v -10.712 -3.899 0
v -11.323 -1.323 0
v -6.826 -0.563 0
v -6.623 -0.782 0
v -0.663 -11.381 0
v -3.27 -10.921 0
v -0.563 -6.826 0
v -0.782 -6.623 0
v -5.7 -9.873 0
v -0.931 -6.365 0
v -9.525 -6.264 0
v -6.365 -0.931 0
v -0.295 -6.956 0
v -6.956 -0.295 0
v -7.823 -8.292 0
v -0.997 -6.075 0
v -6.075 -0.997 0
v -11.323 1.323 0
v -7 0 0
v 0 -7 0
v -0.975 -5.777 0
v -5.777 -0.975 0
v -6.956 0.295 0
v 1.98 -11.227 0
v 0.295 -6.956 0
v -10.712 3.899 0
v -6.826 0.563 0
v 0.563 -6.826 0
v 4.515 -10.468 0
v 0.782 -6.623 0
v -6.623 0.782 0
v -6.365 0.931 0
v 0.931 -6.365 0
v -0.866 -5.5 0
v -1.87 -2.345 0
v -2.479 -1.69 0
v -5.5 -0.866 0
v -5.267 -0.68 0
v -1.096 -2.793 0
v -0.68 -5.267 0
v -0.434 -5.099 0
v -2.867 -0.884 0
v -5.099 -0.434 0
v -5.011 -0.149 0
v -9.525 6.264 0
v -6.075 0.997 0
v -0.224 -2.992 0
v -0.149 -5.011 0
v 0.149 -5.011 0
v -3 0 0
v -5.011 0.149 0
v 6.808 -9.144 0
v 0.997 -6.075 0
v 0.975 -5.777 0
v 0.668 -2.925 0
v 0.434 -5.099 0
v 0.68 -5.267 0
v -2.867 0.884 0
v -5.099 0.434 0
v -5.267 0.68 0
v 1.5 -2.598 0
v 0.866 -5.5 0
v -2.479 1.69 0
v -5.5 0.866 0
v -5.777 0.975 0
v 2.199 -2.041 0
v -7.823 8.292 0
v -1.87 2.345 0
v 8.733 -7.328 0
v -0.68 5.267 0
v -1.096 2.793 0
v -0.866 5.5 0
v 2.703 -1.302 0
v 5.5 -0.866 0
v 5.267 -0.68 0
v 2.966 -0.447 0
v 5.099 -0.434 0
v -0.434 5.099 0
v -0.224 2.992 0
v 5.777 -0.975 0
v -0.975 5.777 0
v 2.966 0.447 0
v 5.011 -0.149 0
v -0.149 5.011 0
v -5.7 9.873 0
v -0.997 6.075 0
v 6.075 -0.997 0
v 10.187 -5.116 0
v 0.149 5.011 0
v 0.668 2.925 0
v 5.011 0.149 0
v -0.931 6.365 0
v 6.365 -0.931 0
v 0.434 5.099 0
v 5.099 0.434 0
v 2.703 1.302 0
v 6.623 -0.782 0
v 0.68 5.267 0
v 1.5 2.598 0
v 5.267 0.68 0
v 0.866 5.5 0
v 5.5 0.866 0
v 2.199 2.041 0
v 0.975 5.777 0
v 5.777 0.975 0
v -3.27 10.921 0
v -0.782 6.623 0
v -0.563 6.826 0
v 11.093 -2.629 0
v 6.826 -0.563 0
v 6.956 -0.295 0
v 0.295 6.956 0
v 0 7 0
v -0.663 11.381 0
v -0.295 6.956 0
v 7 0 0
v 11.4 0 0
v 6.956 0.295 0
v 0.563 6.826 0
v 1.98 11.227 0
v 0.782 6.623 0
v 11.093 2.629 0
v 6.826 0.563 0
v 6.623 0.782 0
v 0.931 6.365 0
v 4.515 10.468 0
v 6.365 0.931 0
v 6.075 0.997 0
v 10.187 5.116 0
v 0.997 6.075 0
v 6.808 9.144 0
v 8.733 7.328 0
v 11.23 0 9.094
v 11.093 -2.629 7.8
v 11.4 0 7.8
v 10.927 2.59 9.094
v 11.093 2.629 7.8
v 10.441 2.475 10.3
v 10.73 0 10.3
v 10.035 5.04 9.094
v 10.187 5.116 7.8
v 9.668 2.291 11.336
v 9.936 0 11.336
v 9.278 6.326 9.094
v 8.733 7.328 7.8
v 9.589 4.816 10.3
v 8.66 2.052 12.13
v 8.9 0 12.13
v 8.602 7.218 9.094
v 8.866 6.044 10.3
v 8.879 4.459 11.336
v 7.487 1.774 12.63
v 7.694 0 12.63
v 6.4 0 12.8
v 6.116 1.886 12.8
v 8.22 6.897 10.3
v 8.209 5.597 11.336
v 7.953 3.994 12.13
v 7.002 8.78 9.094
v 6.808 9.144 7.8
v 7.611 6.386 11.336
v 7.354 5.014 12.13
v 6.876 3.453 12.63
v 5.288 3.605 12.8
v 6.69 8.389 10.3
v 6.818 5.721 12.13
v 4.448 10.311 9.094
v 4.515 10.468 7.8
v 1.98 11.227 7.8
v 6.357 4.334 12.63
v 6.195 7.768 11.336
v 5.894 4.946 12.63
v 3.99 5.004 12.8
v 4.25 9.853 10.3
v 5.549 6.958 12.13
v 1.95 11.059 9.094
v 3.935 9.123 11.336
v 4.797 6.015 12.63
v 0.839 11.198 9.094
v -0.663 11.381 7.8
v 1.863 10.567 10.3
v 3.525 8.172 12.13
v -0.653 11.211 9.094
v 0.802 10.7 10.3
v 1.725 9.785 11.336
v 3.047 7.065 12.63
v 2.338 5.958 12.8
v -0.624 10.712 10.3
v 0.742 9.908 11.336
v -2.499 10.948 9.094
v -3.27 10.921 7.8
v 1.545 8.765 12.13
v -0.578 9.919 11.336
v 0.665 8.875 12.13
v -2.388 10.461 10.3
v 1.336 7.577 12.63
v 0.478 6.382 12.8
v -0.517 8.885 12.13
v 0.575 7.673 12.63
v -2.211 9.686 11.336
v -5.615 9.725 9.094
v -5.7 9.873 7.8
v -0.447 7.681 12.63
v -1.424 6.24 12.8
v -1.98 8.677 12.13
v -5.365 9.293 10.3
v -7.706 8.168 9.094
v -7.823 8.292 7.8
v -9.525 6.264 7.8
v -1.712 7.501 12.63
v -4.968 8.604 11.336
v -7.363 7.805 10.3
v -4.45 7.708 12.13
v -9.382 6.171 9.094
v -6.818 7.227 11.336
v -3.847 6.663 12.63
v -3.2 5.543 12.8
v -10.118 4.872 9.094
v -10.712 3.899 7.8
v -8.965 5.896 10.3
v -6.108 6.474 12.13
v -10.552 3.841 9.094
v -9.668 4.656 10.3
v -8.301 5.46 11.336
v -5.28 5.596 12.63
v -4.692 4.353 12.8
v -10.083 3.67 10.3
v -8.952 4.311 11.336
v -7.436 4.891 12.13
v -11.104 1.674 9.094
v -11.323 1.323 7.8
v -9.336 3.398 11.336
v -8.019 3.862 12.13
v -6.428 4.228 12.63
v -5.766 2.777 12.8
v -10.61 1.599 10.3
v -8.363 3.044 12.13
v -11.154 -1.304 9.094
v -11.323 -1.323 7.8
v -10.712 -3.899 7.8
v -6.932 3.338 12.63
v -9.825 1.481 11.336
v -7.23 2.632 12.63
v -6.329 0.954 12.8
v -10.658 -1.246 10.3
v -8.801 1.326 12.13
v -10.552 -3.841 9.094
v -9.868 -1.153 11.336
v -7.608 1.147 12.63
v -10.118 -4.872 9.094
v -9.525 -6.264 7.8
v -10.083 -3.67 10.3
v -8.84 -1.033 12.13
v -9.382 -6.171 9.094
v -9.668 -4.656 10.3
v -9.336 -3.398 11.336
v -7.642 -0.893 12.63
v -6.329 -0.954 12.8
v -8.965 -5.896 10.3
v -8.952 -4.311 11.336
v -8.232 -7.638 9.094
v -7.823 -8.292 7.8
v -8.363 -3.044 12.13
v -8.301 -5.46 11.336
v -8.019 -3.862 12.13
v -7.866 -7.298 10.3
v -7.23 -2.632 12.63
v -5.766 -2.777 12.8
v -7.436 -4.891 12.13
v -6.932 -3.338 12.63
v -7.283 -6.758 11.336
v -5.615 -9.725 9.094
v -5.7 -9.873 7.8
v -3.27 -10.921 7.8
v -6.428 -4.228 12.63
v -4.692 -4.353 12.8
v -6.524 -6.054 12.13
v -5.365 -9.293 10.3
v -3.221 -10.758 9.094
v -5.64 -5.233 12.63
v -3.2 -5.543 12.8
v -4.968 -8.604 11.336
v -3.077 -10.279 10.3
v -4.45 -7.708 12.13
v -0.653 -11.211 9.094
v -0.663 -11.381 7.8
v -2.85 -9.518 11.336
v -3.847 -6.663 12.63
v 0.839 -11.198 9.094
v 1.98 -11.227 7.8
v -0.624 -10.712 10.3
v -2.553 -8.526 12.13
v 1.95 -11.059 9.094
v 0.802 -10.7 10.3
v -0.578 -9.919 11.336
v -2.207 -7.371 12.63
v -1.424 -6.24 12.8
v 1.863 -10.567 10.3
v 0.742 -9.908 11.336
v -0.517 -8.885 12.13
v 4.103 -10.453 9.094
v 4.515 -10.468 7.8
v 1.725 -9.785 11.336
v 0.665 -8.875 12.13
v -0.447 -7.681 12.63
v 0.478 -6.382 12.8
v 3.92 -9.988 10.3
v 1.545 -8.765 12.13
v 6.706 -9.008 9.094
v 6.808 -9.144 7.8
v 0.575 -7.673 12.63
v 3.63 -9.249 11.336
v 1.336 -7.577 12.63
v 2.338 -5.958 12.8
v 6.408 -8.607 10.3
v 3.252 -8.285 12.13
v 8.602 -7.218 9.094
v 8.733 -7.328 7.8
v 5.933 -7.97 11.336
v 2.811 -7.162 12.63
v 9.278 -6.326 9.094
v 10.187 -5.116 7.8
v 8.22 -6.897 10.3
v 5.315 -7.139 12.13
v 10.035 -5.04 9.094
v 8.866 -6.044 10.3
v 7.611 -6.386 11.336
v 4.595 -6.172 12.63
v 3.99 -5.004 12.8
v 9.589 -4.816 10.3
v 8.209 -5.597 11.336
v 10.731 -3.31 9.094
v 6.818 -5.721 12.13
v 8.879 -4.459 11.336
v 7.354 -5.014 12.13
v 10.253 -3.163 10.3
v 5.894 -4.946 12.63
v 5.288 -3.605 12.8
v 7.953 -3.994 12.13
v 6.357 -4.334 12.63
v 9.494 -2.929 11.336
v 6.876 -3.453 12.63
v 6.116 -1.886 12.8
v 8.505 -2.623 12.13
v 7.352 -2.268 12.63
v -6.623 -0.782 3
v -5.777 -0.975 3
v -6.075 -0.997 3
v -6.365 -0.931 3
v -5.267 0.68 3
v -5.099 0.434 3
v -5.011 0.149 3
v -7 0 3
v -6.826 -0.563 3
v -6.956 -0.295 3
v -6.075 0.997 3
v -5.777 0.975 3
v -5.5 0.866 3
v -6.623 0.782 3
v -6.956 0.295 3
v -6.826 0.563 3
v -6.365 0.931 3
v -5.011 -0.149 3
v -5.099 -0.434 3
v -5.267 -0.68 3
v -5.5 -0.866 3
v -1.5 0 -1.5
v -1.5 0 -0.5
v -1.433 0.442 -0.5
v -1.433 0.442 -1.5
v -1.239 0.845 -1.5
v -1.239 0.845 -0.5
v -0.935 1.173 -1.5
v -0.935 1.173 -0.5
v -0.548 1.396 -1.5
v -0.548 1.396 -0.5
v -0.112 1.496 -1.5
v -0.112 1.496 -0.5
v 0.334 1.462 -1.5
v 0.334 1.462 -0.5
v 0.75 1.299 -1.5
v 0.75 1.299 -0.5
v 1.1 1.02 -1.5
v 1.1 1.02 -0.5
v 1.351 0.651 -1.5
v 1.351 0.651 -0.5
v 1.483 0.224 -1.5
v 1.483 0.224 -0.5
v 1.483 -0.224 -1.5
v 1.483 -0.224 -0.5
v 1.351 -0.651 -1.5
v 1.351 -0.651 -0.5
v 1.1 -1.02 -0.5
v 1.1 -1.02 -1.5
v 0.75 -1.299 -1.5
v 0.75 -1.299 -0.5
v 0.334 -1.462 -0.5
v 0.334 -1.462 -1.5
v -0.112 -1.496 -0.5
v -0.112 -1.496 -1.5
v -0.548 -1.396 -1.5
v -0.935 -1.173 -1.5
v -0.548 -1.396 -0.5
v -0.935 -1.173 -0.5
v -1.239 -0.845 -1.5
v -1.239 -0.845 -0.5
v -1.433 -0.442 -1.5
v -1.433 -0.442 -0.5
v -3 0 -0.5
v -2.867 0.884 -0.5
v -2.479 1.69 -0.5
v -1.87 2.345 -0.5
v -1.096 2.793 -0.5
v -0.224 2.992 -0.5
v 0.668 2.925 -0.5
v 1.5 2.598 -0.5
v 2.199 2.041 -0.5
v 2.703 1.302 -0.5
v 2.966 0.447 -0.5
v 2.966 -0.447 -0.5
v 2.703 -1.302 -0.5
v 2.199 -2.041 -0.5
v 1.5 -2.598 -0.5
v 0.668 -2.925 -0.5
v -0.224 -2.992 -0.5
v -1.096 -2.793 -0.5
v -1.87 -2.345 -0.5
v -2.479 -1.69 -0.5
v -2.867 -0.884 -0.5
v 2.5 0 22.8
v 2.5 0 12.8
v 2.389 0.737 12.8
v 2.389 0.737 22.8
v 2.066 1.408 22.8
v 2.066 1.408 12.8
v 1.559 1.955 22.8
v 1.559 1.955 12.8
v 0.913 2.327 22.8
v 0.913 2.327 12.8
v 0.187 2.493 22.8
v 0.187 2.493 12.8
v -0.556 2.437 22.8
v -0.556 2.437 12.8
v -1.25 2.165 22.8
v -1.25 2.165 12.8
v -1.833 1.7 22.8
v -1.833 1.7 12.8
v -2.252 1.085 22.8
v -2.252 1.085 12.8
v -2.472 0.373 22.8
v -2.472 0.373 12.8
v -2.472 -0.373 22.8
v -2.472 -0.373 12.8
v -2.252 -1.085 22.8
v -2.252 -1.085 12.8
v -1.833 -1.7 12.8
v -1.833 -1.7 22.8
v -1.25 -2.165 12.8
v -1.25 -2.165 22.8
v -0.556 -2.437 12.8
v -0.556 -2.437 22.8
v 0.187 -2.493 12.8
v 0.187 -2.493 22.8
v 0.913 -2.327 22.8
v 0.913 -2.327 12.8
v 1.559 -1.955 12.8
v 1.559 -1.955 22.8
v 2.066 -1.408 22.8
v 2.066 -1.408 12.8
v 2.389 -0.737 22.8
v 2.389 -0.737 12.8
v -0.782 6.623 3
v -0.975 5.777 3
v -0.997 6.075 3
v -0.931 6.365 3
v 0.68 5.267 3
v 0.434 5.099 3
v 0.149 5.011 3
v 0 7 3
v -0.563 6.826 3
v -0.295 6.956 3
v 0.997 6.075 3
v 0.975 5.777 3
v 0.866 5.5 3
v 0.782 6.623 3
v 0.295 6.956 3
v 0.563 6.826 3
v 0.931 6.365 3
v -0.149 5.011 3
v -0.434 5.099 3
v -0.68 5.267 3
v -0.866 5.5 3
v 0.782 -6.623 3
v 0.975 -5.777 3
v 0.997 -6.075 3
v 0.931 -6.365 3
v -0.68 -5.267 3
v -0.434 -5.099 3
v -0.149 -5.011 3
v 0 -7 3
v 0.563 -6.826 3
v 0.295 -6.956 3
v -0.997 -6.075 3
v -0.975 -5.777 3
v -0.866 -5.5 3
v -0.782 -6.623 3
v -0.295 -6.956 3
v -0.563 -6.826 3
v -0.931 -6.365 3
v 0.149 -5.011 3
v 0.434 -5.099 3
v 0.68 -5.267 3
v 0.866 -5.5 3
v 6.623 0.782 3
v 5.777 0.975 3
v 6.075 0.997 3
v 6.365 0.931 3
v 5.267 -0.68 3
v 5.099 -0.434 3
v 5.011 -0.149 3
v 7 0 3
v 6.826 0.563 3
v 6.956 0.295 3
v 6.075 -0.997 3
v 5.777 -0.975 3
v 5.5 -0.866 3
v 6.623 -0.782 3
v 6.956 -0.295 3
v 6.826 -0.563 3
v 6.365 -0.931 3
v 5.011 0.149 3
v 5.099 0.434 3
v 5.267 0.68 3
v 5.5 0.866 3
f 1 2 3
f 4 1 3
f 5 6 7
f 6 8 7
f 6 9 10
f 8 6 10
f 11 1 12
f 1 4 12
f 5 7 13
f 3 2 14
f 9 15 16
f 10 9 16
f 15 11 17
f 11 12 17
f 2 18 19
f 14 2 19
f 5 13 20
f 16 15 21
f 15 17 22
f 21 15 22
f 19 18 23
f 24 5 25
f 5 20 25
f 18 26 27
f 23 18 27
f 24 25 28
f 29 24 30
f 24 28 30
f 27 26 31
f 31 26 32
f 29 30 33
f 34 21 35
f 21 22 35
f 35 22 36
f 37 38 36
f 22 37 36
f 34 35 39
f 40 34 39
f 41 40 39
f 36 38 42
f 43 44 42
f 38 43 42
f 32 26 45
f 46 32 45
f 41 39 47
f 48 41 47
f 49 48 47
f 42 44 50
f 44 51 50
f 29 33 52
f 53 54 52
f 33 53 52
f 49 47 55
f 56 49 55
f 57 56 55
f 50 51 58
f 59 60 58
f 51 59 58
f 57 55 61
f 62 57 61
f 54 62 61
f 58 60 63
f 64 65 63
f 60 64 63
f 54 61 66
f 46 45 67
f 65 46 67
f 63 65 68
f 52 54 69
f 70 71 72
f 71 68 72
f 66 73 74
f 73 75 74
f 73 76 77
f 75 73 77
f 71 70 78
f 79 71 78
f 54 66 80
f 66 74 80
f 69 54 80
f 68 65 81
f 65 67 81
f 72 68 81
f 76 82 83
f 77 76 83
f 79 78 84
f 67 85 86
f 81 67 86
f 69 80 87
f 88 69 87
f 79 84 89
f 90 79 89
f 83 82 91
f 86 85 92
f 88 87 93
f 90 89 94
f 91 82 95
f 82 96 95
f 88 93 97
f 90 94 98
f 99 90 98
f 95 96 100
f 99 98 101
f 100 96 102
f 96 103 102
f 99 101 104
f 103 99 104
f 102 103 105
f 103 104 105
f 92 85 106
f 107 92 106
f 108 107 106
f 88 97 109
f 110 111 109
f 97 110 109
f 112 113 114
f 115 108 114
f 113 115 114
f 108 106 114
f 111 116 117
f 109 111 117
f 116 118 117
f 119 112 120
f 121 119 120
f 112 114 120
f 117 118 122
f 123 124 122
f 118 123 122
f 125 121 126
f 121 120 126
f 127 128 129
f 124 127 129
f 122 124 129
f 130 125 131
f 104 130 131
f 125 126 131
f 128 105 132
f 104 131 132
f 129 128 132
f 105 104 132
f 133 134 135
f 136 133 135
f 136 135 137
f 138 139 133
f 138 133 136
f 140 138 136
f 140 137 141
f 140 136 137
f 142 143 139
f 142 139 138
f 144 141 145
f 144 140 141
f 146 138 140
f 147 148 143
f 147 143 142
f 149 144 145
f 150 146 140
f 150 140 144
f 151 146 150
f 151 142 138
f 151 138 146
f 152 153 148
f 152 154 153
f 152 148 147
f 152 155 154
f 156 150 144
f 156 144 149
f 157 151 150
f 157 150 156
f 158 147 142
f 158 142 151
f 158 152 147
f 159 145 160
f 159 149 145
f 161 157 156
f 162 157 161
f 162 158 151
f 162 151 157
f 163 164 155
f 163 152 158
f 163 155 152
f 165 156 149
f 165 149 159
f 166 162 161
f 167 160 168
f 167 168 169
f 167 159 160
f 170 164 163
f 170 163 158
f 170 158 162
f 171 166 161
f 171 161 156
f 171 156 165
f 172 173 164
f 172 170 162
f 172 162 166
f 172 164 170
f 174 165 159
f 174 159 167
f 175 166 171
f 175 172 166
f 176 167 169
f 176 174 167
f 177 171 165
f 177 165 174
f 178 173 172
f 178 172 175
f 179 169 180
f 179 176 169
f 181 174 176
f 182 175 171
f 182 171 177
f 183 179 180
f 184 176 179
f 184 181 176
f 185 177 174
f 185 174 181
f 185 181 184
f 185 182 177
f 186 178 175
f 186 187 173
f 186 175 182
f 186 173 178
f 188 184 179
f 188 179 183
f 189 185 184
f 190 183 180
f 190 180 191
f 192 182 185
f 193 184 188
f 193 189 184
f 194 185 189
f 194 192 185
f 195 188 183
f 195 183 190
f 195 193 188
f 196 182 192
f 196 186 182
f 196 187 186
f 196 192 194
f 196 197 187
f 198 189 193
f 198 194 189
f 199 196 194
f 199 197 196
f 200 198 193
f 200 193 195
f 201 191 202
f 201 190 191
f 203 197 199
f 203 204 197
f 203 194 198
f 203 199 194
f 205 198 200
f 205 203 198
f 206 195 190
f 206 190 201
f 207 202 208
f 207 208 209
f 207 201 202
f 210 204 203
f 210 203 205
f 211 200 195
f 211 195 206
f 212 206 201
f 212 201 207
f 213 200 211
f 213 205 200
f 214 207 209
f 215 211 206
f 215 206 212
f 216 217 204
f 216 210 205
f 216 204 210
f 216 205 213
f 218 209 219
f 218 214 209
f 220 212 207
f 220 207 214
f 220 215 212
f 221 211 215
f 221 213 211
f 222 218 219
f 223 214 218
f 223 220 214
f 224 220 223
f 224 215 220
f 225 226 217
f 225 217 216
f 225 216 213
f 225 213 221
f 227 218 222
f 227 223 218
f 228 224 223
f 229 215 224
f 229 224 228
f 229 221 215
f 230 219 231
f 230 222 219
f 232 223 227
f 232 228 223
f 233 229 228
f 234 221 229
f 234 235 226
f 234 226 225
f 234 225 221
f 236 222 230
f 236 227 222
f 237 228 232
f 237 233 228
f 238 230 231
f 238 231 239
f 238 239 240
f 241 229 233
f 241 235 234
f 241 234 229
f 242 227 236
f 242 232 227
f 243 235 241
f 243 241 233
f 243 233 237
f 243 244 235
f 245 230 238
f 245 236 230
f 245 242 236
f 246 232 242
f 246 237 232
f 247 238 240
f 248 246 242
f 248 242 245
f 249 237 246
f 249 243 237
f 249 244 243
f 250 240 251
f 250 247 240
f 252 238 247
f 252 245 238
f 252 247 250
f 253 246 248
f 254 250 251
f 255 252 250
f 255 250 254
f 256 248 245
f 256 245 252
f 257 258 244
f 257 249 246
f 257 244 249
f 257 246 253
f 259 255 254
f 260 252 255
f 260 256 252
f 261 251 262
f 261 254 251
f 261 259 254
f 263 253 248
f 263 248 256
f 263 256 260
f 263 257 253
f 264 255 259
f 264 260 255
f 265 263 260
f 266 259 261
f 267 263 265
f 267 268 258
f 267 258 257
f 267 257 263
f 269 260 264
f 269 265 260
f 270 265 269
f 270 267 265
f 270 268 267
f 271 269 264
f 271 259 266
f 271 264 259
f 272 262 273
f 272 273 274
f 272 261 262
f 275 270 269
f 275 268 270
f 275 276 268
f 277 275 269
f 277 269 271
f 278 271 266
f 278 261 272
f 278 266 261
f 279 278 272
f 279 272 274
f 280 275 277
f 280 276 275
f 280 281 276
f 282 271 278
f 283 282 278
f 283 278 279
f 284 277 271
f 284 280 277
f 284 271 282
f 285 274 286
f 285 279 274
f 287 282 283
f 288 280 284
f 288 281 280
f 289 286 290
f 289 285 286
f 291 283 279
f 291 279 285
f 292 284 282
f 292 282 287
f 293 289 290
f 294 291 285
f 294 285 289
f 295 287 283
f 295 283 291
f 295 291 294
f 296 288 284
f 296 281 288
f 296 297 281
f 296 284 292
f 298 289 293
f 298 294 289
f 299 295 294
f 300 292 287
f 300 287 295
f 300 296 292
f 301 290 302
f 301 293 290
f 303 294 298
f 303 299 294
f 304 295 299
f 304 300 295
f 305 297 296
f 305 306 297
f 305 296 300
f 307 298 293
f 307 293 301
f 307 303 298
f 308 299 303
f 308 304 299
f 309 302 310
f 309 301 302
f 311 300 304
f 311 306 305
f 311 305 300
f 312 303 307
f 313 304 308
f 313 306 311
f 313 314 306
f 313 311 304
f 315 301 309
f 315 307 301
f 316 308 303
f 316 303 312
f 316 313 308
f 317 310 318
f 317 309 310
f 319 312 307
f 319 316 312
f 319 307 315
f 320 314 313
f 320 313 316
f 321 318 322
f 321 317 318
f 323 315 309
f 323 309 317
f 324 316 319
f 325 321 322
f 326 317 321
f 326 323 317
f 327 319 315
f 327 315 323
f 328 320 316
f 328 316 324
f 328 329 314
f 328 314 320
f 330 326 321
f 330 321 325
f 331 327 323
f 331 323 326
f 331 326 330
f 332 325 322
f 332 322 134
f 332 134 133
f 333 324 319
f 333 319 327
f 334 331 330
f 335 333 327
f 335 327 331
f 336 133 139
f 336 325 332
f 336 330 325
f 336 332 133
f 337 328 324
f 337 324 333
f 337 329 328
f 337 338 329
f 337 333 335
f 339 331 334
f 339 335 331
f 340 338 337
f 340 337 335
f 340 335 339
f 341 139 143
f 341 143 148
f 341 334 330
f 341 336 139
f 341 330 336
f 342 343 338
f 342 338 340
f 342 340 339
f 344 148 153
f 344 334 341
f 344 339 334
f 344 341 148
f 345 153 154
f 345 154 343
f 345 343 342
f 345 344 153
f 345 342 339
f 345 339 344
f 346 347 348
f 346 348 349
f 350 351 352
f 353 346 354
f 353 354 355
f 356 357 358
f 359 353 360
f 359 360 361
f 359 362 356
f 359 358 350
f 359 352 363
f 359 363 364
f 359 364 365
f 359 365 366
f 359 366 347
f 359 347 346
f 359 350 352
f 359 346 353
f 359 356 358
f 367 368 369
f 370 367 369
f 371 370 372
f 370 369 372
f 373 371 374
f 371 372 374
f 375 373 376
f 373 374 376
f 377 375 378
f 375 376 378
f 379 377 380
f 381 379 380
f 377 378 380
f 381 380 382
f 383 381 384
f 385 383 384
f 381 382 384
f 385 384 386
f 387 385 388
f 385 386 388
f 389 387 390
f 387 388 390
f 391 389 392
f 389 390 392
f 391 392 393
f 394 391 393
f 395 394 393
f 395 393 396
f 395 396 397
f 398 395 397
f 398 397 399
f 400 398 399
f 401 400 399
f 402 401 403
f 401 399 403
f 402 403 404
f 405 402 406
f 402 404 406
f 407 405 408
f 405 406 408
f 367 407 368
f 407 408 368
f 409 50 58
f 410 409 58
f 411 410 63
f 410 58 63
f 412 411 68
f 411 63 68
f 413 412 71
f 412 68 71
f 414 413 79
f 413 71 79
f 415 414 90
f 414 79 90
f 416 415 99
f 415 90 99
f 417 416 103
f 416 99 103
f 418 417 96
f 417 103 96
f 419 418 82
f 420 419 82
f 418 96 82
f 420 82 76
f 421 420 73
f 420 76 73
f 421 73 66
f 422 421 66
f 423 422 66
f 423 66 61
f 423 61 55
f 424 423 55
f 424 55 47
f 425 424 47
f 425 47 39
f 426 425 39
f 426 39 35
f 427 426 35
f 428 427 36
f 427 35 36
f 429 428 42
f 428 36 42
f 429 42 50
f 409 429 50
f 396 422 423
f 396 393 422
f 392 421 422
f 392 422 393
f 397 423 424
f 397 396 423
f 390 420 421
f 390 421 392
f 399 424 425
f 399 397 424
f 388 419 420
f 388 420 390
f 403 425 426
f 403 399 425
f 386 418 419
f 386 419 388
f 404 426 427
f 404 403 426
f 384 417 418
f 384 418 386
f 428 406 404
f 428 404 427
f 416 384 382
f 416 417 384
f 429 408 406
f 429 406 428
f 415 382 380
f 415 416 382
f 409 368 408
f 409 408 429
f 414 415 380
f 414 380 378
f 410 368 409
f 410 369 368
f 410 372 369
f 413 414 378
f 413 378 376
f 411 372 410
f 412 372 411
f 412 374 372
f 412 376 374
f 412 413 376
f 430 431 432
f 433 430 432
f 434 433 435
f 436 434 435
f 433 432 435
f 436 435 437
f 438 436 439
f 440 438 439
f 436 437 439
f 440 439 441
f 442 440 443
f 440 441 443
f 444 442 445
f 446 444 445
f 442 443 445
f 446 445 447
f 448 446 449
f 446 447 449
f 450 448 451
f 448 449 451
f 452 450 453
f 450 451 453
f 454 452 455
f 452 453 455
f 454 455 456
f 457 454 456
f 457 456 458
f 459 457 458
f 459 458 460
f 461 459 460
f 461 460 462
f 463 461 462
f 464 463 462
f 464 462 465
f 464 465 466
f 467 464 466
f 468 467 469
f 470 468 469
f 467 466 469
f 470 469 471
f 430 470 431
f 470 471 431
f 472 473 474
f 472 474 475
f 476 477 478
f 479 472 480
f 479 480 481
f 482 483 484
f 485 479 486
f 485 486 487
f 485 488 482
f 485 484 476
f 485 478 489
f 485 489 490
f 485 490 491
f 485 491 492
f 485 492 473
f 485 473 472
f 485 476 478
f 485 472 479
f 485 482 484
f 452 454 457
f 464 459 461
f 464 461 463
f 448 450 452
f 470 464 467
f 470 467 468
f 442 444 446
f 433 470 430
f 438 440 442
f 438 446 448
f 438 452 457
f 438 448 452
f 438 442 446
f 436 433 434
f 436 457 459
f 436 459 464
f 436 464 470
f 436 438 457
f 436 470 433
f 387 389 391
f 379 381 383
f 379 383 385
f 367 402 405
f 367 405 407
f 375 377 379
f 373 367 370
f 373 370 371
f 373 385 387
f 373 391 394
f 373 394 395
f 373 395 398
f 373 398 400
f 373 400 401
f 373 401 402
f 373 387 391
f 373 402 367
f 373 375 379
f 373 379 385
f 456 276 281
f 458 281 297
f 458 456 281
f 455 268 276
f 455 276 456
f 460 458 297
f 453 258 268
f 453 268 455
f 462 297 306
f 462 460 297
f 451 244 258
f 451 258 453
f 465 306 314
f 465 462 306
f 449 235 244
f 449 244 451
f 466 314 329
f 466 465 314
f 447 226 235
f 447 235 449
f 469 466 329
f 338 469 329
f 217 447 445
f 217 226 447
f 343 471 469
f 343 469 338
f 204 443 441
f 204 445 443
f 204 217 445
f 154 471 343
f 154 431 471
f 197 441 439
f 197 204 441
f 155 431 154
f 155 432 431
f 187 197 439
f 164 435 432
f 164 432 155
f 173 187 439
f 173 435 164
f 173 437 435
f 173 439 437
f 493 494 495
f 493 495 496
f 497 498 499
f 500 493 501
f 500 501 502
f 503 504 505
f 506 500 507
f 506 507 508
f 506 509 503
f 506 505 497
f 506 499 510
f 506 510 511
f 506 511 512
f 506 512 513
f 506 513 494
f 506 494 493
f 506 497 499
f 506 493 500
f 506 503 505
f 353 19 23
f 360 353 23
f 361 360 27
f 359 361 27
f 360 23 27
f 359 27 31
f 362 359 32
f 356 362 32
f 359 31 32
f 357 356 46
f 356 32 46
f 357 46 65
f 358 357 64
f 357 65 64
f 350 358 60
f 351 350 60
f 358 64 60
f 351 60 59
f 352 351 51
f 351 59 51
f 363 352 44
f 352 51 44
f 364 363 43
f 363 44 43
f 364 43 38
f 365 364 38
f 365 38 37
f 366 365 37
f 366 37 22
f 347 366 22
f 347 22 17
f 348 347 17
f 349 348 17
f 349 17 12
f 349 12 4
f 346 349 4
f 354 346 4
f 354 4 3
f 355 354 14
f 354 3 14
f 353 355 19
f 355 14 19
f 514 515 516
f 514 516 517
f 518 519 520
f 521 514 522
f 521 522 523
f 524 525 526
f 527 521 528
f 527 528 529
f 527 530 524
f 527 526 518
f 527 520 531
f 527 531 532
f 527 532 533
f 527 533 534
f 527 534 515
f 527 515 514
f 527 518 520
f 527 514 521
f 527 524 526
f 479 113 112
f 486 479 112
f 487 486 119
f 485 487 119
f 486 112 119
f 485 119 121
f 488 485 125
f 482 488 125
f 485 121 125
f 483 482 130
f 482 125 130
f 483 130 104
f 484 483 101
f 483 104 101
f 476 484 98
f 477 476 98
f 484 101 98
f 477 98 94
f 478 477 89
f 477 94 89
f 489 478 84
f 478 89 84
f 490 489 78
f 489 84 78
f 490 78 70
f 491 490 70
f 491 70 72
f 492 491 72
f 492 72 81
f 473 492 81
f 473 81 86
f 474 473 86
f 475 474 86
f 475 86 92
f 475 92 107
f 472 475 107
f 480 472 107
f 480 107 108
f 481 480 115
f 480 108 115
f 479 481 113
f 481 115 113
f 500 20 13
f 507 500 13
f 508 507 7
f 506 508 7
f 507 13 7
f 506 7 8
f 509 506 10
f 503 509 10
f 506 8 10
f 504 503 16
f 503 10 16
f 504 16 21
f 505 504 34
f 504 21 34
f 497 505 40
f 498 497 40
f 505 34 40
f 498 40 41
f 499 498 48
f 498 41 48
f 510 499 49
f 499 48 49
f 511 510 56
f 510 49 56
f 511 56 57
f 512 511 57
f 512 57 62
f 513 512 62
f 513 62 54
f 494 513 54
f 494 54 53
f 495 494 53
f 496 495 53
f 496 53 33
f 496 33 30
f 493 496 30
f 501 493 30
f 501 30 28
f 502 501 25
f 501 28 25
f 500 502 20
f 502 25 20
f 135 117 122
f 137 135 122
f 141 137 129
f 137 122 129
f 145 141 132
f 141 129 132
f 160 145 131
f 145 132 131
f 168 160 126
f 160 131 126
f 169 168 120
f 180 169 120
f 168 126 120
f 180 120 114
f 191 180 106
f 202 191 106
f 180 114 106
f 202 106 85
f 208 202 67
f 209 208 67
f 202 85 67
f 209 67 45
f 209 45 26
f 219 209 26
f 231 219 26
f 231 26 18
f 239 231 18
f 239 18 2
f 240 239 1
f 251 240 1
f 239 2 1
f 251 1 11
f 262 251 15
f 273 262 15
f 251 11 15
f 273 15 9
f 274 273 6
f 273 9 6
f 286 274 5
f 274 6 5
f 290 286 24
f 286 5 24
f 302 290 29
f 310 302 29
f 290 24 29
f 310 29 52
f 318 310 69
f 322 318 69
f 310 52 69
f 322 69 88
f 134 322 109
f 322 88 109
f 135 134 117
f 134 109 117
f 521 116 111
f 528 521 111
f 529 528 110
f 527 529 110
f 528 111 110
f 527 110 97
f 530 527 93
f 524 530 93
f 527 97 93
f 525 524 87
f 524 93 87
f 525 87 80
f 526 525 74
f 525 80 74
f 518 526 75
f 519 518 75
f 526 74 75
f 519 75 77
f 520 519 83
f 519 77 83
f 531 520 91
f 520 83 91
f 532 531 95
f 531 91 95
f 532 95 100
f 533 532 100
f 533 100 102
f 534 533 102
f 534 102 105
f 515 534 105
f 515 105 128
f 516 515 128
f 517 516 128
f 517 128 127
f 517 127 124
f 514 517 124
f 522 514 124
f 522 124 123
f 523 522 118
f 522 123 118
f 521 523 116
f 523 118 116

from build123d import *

# Parameters (mm, degrees)
SKETCH_1_R               = 11.4
EXTRUDE_1_DEPTH          = 12.8
SKETCH_2_R               = 1
CUT_EXTRUDE_1_DEPTH      = 3
PATTERN_CIRCULAR_1_COUNT = 4
SKETCH_3_R               = 3
EXTRUDE_2_DEPTH          = 0.5
SKETCH_4_R               = 1.5
EXTRUDE_3_DEPTH          = 1
SKETCH_5_R               = 2.5
EXTRUDE_4_DEPTH          = 10
FILLET_1_R               = 5


with BuildPart() as part:
    # 草图1 → 凸台-拉伸1 (new body)
    with BuildSketch(Plane.XY):
        Circle(SKETCH_1_R)
    extrude(amount=EXTRUDE_1_DEPTH)

    # 草图2 → 切除-拉伸1 (cut)
    with BuildSketch(Plane(origin=(0, 0, 0), x_dir=(-1, 0, 0), z_dir=(0, 0, -1))):
        with Locations((6, 0)):
            Circle(SKETCH_2_R)
    cut_extrude_1 = extrude(amount=-CUT_EXTRUDE_1_DEPTH, mode=Mode.SUBTRACT)

    # 阵列(圆周)1: 切除-拉伸1 ×4 about axis
    pattern_circular_1_axis = Axis((0, 0, 13.44), (0, 0, -1))
    for i in range(1, PATTERN_CIRCULAR_1_COUNT):
        add(cut_extrude_1.rotate(pattern_circular_1_axis, i * 360 / PATTERN_CIRCULAR_1_COUNT), mode=Mode.SUBTRACT)

    # 草图3 → 凸台-拉伸2 (add)
    with BuildSketch(Plane(origin=(0, 0, 0), x_dir=(-1, 0, 0), z_dir=(0, 0, -1))):
        Circle(SKETCH_3_R)
    extrude(amount=EXTRUDE_2_DEPTH)

    # 草图4 → 凸台-拉伸3 (add)
    with BuildSketch(Plane(origin=(0, 0, -0.5), x_dir=(-1, 0, 0), z_dir=(0, 0, -1))):
        Circle(SKETCH_4_R)
    extrude(amount=EXTRUDE_3_DEPTH)

    # 草图5 → 凸台-拉伸4 (add)
    with BuildSketch(Plane.XY.offset(12.8)):
        Circle(SKETCH_5_R)
    extrude(amount=EXTRUDE_4_DEPTH)

    # 圆角1
    fillet_1_edges = [part.edges().sort_by_distance(p)[0] for p in [
        (-11.4, 0, 12.8),
    ]]
    fillet(fillet_1_edges, radius=FILLET_1_R)


solid = part.part
